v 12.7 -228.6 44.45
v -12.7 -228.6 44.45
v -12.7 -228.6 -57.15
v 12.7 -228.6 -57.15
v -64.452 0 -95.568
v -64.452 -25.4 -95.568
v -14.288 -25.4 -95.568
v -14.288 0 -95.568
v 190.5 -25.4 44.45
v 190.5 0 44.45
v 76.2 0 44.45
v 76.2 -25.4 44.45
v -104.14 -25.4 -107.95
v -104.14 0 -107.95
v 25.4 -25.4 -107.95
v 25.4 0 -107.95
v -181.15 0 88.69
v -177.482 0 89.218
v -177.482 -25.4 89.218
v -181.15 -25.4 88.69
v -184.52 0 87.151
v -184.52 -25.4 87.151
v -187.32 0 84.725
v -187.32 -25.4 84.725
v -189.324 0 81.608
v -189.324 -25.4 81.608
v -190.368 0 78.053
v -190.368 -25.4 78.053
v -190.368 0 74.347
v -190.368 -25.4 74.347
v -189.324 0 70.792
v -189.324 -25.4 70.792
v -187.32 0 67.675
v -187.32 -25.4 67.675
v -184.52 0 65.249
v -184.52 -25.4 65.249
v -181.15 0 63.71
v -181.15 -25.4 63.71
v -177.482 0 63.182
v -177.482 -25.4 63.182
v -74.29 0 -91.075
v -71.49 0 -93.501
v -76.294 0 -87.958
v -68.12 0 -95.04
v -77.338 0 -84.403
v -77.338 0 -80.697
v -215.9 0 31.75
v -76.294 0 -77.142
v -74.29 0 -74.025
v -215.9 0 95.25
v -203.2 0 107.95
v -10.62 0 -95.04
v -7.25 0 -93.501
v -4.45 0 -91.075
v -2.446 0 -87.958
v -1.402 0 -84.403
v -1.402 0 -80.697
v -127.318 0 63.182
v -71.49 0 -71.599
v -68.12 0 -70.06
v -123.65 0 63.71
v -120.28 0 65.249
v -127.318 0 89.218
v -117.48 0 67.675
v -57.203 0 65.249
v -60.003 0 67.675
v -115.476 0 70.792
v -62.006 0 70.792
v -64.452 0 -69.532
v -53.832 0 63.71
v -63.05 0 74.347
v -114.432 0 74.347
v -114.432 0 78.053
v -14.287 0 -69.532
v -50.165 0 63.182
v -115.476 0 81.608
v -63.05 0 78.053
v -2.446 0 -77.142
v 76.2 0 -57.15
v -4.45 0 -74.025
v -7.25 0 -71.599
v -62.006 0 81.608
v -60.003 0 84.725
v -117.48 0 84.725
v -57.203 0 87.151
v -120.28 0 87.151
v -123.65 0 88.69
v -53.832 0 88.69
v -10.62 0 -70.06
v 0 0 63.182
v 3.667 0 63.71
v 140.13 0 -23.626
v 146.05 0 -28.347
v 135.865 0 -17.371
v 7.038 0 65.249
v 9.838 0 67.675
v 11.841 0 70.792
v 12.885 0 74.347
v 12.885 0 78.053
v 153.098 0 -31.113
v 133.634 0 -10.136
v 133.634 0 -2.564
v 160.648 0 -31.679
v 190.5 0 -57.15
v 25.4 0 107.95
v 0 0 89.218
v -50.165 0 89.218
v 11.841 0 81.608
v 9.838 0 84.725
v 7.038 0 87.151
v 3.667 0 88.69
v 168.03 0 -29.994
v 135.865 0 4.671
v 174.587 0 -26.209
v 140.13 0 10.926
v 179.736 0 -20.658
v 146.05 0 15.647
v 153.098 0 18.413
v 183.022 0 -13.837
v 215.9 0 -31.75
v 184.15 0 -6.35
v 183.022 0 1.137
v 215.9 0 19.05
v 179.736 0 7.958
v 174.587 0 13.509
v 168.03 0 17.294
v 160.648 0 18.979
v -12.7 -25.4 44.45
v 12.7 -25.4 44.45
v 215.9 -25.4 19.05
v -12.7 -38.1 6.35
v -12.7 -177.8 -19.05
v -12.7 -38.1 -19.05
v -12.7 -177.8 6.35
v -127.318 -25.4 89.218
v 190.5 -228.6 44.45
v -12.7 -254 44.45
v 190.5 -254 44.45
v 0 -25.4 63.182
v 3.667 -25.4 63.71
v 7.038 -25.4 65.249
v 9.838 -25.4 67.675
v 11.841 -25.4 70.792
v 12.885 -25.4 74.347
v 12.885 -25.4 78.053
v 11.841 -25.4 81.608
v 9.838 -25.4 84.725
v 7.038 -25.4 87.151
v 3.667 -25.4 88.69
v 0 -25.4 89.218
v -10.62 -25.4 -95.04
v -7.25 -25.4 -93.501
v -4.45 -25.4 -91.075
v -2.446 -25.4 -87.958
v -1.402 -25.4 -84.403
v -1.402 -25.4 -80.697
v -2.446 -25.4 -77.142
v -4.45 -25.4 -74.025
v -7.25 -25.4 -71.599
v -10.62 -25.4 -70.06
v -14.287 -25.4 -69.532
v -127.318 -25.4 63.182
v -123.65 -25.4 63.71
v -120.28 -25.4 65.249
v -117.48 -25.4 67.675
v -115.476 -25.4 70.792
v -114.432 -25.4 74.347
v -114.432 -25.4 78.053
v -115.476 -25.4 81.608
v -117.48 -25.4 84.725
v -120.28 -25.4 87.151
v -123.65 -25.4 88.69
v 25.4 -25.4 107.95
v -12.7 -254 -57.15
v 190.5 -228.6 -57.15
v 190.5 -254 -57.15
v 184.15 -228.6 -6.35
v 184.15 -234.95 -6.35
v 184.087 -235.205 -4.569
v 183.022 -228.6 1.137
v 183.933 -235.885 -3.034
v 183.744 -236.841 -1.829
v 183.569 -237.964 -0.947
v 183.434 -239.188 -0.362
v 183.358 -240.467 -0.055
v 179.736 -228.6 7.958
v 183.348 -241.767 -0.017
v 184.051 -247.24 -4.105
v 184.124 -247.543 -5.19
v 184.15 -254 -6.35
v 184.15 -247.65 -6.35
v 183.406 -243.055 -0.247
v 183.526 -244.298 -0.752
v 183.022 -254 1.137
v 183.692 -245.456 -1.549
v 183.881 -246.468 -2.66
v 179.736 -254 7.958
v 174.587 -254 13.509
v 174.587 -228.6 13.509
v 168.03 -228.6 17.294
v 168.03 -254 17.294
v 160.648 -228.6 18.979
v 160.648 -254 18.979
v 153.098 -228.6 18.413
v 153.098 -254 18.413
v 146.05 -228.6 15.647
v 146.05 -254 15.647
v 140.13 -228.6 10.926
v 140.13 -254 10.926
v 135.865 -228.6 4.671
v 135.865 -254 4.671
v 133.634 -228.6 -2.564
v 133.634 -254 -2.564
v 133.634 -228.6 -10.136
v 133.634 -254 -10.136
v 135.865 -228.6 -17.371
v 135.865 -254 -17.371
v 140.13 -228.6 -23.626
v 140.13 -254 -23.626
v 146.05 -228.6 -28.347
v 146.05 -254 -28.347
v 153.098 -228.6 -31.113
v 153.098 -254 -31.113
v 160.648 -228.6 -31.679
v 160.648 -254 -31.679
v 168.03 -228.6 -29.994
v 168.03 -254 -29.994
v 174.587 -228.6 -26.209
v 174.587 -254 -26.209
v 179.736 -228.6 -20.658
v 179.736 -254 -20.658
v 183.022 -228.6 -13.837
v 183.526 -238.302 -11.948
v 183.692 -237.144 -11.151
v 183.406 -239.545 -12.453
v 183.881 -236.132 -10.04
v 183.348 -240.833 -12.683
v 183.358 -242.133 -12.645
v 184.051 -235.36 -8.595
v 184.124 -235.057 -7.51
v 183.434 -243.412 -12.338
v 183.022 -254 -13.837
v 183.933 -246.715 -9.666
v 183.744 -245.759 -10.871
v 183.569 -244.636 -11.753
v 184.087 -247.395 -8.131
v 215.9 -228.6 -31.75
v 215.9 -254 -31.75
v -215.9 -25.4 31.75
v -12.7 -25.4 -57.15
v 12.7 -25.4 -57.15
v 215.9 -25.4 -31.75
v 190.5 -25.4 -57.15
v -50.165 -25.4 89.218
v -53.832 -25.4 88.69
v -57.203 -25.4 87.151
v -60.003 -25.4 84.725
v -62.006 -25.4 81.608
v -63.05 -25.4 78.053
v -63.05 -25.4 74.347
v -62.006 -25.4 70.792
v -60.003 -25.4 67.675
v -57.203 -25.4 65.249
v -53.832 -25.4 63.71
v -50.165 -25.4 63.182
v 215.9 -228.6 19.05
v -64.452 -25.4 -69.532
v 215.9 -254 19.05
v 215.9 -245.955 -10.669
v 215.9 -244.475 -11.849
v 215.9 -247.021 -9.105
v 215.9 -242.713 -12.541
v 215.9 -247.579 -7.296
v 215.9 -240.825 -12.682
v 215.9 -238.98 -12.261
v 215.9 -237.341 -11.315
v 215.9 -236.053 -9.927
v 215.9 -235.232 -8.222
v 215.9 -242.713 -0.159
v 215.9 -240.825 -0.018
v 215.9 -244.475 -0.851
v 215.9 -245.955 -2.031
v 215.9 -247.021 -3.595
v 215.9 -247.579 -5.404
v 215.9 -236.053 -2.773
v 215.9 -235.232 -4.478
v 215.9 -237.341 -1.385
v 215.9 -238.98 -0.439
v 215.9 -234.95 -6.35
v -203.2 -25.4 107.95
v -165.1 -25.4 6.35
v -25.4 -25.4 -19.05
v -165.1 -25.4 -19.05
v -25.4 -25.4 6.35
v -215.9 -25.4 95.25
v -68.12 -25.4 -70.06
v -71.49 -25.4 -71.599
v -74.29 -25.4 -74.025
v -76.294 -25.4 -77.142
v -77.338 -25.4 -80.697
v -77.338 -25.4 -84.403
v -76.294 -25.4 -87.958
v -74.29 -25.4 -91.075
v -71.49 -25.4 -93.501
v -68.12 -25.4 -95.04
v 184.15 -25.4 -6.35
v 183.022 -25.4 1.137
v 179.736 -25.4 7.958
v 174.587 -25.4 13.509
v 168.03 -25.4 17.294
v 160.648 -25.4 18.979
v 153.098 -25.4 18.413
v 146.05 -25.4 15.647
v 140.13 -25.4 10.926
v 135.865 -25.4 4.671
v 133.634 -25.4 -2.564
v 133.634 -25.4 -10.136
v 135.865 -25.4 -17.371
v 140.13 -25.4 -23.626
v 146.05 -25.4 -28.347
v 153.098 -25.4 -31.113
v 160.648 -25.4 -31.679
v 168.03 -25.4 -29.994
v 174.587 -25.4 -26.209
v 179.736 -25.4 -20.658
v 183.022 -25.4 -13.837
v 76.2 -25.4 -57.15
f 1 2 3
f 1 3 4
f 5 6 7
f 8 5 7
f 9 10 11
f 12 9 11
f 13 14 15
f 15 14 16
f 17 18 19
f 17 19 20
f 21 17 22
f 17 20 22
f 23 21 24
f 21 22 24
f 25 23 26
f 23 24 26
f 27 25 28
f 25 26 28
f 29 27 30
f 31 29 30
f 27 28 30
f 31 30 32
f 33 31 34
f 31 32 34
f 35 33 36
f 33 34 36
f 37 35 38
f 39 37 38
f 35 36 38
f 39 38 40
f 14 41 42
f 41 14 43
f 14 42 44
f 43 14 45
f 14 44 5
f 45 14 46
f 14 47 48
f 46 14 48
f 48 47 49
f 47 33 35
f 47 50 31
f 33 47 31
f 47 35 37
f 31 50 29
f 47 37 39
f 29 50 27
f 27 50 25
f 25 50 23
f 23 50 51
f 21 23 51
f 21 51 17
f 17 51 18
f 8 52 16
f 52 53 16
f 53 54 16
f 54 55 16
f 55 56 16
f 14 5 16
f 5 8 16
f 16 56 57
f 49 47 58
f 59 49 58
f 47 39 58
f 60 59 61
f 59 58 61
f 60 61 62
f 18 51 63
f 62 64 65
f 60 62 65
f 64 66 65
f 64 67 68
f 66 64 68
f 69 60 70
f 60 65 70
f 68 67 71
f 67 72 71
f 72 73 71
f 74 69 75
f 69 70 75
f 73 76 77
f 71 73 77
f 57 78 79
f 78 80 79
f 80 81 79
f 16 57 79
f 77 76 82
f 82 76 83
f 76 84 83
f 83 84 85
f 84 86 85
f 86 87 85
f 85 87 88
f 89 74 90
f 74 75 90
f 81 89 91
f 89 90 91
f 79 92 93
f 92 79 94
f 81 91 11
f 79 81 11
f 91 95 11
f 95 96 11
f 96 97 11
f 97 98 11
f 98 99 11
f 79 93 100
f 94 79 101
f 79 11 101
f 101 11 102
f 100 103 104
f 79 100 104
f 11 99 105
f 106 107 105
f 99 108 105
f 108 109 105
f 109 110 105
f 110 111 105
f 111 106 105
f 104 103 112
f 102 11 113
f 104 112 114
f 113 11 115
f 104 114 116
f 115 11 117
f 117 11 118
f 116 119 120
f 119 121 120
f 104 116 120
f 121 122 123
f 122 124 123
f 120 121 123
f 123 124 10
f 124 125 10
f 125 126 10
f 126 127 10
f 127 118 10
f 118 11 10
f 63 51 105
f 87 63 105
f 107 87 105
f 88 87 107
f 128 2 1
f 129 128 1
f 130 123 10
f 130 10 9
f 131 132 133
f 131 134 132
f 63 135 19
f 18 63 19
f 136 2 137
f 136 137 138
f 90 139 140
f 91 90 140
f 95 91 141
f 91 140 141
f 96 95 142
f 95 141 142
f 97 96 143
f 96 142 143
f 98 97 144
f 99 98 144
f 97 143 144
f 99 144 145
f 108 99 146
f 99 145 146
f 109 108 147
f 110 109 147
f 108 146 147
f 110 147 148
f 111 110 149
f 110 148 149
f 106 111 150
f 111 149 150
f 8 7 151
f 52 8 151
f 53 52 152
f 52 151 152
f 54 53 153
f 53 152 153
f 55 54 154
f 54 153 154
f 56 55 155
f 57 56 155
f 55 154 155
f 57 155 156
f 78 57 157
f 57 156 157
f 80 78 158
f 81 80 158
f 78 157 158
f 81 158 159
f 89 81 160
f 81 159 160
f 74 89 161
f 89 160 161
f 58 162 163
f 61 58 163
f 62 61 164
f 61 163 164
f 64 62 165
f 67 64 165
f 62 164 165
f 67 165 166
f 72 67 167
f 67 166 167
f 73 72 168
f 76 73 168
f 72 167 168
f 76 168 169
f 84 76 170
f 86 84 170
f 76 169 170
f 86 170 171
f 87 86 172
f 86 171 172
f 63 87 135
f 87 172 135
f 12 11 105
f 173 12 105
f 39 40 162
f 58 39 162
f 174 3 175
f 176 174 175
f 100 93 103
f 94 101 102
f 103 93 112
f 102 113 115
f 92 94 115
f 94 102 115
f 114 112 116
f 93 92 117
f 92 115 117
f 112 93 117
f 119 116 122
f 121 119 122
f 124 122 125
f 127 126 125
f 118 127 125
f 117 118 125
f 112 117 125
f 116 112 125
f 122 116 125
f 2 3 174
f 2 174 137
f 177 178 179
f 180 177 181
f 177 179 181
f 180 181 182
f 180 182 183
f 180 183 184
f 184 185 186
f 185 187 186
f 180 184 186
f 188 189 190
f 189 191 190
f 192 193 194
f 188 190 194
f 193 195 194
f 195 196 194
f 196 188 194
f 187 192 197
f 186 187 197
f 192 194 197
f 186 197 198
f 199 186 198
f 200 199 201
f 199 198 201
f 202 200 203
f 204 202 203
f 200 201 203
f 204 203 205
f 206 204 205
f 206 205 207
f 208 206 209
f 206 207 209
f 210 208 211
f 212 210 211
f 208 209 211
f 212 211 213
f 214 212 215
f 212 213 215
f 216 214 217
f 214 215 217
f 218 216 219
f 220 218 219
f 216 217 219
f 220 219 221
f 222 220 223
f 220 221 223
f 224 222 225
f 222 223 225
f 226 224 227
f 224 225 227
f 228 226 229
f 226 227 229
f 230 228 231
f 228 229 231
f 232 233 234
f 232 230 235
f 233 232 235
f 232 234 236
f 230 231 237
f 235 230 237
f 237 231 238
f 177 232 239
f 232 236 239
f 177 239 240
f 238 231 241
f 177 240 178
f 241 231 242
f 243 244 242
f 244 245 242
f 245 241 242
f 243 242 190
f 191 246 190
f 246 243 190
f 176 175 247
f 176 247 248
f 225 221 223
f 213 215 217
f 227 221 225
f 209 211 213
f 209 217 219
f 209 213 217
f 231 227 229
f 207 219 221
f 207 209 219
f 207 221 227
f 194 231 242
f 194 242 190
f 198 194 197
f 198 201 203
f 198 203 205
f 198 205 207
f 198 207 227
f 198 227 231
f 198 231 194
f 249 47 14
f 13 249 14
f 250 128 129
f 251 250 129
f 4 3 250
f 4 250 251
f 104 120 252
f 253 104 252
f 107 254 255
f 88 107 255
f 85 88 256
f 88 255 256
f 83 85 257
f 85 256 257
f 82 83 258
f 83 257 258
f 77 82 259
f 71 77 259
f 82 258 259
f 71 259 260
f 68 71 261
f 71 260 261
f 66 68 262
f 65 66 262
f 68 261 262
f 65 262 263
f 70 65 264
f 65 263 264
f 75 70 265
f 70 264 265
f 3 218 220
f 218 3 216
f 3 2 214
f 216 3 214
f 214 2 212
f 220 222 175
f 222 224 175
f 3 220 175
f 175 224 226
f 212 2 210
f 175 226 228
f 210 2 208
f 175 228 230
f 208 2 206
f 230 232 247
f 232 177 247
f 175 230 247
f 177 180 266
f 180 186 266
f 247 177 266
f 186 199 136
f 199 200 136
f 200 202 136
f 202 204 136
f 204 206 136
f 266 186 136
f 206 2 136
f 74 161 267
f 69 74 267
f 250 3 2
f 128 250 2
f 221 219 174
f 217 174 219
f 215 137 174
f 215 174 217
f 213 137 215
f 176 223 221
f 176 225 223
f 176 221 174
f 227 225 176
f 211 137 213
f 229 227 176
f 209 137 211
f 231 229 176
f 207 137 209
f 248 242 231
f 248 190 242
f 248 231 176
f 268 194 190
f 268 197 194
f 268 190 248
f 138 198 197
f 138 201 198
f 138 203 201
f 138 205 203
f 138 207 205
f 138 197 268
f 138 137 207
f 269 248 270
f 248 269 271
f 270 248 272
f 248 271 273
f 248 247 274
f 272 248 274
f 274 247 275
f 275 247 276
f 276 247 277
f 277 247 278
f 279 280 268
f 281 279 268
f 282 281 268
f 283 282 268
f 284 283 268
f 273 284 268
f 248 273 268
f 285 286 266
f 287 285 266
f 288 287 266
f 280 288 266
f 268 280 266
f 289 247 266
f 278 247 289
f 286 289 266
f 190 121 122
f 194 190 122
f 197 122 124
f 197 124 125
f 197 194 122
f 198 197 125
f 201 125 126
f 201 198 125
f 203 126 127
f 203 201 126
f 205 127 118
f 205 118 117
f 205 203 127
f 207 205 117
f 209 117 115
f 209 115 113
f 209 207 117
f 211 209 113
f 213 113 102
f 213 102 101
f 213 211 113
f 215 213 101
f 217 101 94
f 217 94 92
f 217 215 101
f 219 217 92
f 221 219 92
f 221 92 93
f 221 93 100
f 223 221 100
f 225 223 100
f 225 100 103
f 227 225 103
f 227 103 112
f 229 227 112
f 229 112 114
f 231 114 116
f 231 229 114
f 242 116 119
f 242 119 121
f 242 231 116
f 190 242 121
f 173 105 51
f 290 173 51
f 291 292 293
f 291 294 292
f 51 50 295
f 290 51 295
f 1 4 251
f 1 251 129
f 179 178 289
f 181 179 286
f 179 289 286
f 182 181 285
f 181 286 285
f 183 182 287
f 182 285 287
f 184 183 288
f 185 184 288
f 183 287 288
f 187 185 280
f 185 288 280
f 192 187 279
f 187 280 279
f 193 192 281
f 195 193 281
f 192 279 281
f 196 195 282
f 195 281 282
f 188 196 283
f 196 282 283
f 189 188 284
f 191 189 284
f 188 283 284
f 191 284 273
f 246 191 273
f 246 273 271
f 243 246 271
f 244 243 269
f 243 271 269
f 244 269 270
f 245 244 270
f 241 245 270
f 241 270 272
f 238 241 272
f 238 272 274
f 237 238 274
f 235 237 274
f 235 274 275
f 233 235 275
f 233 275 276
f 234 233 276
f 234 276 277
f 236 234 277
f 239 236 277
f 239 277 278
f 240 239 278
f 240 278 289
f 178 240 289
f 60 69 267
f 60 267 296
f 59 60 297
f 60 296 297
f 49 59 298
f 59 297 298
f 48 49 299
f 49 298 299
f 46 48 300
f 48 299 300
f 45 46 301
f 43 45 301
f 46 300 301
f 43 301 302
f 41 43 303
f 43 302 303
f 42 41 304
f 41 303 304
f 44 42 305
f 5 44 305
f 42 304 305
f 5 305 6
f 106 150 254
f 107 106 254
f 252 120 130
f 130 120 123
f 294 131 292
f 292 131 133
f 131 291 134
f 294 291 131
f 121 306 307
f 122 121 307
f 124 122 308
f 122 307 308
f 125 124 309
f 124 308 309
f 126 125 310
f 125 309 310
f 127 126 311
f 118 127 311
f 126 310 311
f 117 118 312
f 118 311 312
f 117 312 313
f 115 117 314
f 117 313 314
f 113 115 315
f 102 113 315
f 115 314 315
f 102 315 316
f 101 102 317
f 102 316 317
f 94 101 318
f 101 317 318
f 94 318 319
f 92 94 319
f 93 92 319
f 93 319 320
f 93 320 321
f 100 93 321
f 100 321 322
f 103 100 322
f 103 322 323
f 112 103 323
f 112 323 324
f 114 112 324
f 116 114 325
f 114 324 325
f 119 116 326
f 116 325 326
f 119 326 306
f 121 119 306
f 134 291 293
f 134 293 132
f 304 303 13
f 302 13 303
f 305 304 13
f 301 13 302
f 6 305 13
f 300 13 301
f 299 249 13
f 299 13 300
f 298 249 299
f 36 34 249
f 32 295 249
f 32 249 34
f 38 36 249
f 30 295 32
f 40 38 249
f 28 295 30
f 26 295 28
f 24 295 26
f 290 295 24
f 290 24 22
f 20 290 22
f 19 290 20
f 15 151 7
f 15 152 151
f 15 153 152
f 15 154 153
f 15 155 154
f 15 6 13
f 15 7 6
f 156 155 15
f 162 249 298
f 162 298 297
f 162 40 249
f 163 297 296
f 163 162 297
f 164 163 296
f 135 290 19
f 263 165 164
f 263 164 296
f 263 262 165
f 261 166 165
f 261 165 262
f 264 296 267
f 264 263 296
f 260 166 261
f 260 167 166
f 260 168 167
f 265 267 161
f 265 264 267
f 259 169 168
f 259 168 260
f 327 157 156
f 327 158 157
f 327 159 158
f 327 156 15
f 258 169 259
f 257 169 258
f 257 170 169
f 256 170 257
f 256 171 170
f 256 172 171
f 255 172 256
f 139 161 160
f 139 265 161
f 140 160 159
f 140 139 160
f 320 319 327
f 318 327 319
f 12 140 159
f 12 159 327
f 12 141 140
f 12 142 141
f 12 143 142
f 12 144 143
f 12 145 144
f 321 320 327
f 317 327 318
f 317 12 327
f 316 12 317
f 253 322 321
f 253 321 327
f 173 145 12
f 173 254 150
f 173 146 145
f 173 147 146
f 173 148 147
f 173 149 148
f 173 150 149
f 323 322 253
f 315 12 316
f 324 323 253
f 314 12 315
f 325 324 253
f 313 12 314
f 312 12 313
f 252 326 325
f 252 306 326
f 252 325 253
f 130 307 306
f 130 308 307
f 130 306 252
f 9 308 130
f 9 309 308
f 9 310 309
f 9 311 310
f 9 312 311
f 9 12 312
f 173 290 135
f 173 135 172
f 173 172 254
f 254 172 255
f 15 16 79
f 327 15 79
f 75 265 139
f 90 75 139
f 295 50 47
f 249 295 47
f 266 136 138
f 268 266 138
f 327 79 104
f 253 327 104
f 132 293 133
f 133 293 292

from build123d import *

# Parameters (mm, degrees)
F1_DEPTH   = 25.4
F2_R       = 25.4
F3_DEPTH   = 25.4
F4_W       = 25.4
F4_H       = 101.6
F5_DEPTH   = 203.2
F6_W       = 228.6
F6_H       = 101.6
F7_DEPTH   = 25.4
F8_R       = 25.4
F9_DEPTH   = 25.4
F12_DEPTH  = 12.7
F13_SIZE   = 12.7
F14_SIZE   = 25.4
F14_2_SIZE = 25.4
F15_SIZE   = 12.7
F16_DEPTH  = 254
F17_R      = 6.35
F18_DEPTH  = 32.5575558516
F20_DEPTH  = 25.4


with BuildPart() as f1:
    # F0 (on Front) → F1 (new body)
    with BuildSketch(Plane.XZ):
        Polygon((25.4, 107.95), (-215.9, 107.95), (-215.9, 31.75), (-104.14, -107.95), (25.4, -107.95), (76.2, -57.15), (215.9, -57.15), (215.9, 44.45), (76.2, 44.45), align=None)
    extrude(amount=F1_DEPTH)

    # F2 (on face) → F3 (cut)
    with BuildSketch(Plane.XZ.offset(25.4)):
        with Locations((158.75, -6.35)):
            Circle(F2_R)
    extrude(amount=-F3_DEPTH, mode=Mode.SUBTRACT)

    # F14
    f14_edges = [f1.edges().sort_by_distance(p)[0] for p in [
        (215.9, -12.7, -57.15),
        (215.9, -12.7, 44.45),
    ]]
    chamfer(f14_edges, length=F14_SIZE)

    # F15
    f15_edges = [f1.edges().sort_by_distance(p)[0] for p in [
        (-215.9, -12.7, 107.95),
    ]]
    chamfer(f15_edges, length=F15_SIZE)

    # F19 (on face) → F20 (cut)
    with BuildSketch(Plane.XZ.offset(25.4)):
        with BuildLine():
            Line((-127.3175, 89.2175), (-177.4825, 89.2175))
            ThreePointArc((-177.4825, 89.2175), (-190.5, 76.2), (-177.4825, 63.1825))
            Line((-177.4825, 63.1825), (-127.3175, 63.1825))
            ThreePointArc((-127.3175, 63.1825), (-114.3, 76.2), (-127.3175, 89.2175))
        make_face()
        with BuildLine():
            Line((0, 89.2175), (-50.165, 89.2175))
            ThreePointArc((-50.165, 89.2175), (-63.1825, 76.2), (-50.165, 63.1825))
            Line((-50.165, 63.1825), (0, 63.1825))
            ThreePointArc((0, 63.1825), (13.0175, 76.2), (0, 89.2175))
        make_face()
        with BuildLine():
            Line((-14.2875, -69.5325), (-64.4525, -69.5325))
            ThreePointArc((-64.4525, -69.5325), (-77.47, -82.55), (-64.4525, -95.5675))
            Line((-64.4525, -95.5675), (-14.2875, -95.5675))
            ThreePointArc((-14.2875, -95.5675), (-1.27, -82.55), (-14.2875, -69.5325))
        make_face()
    extrude(amount=-F20_DEPTH, mode=Mode.SUBTRACT)


with BuildPart() as f5:
    # F4 (on face) → F5 (new body)
    with BuildSketch(Plane.XZ.offset(25.4)):
        with Locations((0, -6.35)):
            Rectangle(F4_W, F4_H)
    extrude(amount=F5_DEPTH)


with BuildPart() as f7:
    # F6 (on face) → F7 (new body)
    with BuildSketch(Plane.XZ.offset(228.6)):
        with Locations((101.6, -6.35)):
            Rectangle(F6_W, F6_H)
    extrude(amount=F7_DEPTH)

    # F8 (on face) → F9 (cut)
    with BuildSketch(Plane.XZ.offset(254)):
        with Locations((158.75, -6.35)):
            Circle(F8_R)
    extrude(amount=-F9_DEPTH, mode=Mode.SUBTRACT)

    # F14#2
    f14_2_edges = [f7.edges().sort_by_distance(p)[0] for p in [
        (215.9, -241.3, 44.45),
        (215.9, -241.3, -57.15),
    ]]
    chamfer(f14_2_edges, length=F14_2_SIZE)

    # F17 (on face) → F18 (cut, through all)
    with BuildSketch(Plane.YZ.offset(215.9)):
        with Locations((-241.3, -6.35)):
            Circle(F17_R)
    extrude(amount=-F18_DEPTH, mode=Mode.SUBTRACT)


with BuildPart() as f12:
    # F11 (on mid) → F12 (new body, symmetric)
    with BuildSketch(Plane.XY.offset(-6.35)):
        Polygon((-12.7, -25.4), (-165.1, -25.4), (-12.7, -177.8), align=None)
    extrude(amount=F12_DEPTH, both=True)

    # F13
    f13_edges = [f12.edges().sort_by_distance(p)[0] for p in [
        (-12.7, -25.4, -6.35),
    ]]
    chamfer(f13_edges, length=F13_SIZE)


with BuildPart() as f16:
    # F8 (on face) → F16 (new body, through all)
    with BuildSketch(Plane.XZ.offset(254)):
        with Locations((158.75, -6.35)):
            Circle(F8_R)
    extrude(amount=-F16_DEPTH)


solid = Compound([f1.part, f5.part, f7.part, f12.part, f16.part])
